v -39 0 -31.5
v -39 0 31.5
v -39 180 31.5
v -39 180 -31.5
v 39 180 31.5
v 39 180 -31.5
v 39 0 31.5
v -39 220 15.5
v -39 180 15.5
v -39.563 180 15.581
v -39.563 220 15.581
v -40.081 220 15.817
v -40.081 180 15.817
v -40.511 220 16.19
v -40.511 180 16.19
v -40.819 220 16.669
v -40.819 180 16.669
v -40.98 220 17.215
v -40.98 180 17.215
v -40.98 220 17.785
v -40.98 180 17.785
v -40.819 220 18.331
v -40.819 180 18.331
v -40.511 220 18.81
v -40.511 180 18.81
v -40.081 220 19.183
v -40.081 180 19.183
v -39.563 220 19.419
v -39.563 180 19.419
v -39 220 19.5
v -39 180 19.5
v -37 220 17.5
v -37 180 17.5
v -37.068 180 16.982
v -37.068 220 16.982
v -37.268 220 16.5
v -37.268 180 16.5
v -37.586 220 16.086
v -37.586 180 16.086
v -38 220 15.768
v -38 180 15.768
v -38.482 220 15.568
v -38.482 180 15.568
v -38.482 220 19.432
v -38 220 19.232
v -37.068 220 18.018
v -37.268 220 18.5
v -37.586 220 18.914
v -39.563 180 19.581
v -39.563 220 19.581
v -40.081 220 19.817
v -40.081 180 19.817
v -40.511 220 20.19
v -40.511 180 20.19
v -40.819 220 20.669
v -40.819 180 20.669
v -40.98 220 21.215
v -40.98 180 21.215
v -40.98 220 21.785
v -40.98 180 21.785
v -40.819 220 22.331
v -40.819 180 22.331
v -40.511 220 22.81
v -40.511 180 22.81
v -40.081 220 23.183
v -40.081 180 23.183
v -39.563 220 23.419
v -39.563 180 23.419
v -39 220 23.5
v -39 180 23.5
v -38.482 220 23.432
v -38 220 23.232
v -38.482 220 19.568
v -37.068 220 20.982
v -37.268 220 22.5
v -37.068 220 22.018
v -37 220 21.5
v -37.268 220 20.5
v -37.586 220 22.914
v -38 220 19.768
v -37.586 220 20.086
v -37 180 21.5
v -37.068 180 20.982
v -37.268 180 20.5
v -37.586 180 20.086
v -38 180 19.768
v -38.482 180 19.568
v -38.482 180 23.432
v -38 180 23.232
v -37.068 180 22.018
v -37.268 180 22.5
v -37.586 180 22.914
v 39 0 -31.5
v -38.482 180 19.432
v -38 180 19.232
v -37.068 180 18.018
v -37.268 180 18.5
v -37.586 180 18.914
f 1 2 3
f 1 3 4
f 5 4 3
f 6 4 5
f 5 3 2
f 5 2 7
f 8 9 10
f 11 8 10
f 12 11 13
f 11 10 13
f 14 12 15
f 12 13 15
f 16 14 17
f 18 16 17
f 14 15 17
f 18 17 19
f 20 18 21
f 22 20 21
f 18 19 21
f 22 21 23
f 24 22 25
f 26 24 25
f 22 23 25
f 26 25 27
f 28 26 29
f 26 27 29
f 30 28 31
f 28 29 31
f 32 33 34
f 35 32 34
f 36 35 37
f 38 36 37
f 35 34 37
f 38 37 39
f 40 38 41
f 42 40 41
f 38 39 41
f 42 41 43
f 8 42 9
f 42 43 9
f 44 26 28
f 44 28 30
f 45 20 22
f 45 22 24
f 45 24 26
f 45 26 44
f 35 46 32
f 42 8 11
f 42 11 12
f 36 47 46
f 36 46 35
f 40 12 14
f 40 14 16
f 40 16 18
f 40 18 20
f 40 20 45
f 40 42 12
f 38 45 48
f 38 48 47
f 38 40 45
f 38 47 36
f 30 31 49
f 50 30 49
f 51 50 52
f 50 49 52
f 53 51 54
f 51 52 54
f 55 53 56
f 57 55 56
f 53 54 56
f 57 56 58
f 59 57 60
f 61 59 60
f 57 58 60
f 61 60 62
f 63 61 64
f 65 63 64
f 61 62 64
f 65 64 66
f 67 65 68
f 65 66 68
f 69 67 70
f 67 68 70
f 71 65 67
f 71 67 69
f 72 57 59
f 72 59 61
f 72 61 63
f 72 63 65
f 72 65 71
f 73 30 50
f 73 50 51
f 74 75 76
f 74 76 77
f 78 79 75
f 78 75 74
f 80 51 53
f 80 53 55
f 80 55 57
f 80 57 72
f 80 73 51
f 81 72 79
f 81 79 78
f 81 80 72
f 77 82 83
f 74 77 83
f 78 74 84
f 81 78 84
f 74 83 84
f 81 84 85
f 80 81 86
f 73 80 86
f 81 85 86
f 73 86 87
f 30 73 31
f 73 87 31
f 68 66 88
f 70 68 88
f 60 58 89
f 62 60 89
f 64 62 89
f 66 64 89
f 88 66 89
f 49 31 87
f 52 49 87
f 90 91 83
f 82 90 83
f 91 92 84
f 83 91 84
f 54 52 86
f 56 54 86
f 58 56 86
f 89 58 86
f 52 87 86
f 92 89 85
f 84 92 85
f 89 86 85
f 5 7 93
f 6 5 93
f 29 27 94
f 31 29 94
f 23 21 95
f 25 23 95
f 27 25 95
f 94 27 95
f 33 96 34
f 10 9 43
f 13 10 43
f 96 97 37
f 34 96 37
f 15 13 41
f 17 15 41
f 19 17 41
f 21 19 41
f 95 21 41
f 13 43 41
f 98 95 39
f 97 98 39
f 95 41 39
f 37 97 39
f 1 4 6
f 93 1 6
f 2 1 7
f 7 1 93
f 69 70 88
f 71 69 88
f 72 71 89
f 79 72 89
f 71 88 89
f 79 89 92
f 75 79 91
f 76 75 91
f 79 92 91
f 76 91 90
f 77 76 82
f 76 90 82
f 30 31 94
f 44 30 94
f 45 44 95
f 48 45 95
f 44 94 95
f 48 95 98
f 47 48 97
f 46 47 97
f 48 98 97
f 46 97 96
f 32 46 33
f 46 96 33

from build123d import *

# Parameters (mm, degrees)
SKETCH1_W           = 78
SKETCH1_H           = 63
BOSS_EXTRUDE1_DEPTH = 180
BOSS_EXTRUDE4_DEPTH = 40


with BuildPart() as part:
    # Sketch1 → Boss-Extrude1 (new body)
    with BuildSketch(Plane(origin=(0, 0, 0), x_dir=(1, 0, 0), z_dir=(0, 1, 0))):
        Rectangle(SKETCH1_W, SKETCH1_H)
    extrude(amount=BOSS_EXTRUDE1_DEPTH)


with BuildPart() as body_2:
    # Sketch2 → Boss-Extrude4 (new body)
    with BuildSketch(Plane(origin=(0, 180, 0), x_dir=(1, 0, 0), z_dir=(0, 1, 0))):
        with BuildLine():
            ThreePointArc((-39, -23.5), (-37.585786438, -22.914213562), (-37, -21.5))
            ThreePointArc((-37, -21.5), (-37.585786438, -20.085786438), (-39, -19.5))
            Line((-39, -19.5), (-39, -23.5))
        make_face()
        with BuildLine():
            Line((-39, -23.5), (-39, -19.5))
            ThreePointArc((-39, -19.5), (-41, -21.5), (-39, -23.5))
        make_face()
        with BuildLine():
            ThreePointArc((-39, -15.5), (-41, -17.5), (-39, -19.5))
            Line((-39, -19.5), (-39, -15.5))
        make_face()
        with BuildLine():
            Line((-39, -15.5), (-39, -19.5))
            ThreePointArc((-39, -19.5), (-37.585786438, -18.914213562), (-37, -17.5))
            ThreePointArc((-37, -17.5), (-37.585786438, -16.085786438), (-39, -15.5))
        make_face()
    extrude(amount=BOSS_EXTRUDE4_DEPTH)


solid = Compound([part.part, body_2.part])
